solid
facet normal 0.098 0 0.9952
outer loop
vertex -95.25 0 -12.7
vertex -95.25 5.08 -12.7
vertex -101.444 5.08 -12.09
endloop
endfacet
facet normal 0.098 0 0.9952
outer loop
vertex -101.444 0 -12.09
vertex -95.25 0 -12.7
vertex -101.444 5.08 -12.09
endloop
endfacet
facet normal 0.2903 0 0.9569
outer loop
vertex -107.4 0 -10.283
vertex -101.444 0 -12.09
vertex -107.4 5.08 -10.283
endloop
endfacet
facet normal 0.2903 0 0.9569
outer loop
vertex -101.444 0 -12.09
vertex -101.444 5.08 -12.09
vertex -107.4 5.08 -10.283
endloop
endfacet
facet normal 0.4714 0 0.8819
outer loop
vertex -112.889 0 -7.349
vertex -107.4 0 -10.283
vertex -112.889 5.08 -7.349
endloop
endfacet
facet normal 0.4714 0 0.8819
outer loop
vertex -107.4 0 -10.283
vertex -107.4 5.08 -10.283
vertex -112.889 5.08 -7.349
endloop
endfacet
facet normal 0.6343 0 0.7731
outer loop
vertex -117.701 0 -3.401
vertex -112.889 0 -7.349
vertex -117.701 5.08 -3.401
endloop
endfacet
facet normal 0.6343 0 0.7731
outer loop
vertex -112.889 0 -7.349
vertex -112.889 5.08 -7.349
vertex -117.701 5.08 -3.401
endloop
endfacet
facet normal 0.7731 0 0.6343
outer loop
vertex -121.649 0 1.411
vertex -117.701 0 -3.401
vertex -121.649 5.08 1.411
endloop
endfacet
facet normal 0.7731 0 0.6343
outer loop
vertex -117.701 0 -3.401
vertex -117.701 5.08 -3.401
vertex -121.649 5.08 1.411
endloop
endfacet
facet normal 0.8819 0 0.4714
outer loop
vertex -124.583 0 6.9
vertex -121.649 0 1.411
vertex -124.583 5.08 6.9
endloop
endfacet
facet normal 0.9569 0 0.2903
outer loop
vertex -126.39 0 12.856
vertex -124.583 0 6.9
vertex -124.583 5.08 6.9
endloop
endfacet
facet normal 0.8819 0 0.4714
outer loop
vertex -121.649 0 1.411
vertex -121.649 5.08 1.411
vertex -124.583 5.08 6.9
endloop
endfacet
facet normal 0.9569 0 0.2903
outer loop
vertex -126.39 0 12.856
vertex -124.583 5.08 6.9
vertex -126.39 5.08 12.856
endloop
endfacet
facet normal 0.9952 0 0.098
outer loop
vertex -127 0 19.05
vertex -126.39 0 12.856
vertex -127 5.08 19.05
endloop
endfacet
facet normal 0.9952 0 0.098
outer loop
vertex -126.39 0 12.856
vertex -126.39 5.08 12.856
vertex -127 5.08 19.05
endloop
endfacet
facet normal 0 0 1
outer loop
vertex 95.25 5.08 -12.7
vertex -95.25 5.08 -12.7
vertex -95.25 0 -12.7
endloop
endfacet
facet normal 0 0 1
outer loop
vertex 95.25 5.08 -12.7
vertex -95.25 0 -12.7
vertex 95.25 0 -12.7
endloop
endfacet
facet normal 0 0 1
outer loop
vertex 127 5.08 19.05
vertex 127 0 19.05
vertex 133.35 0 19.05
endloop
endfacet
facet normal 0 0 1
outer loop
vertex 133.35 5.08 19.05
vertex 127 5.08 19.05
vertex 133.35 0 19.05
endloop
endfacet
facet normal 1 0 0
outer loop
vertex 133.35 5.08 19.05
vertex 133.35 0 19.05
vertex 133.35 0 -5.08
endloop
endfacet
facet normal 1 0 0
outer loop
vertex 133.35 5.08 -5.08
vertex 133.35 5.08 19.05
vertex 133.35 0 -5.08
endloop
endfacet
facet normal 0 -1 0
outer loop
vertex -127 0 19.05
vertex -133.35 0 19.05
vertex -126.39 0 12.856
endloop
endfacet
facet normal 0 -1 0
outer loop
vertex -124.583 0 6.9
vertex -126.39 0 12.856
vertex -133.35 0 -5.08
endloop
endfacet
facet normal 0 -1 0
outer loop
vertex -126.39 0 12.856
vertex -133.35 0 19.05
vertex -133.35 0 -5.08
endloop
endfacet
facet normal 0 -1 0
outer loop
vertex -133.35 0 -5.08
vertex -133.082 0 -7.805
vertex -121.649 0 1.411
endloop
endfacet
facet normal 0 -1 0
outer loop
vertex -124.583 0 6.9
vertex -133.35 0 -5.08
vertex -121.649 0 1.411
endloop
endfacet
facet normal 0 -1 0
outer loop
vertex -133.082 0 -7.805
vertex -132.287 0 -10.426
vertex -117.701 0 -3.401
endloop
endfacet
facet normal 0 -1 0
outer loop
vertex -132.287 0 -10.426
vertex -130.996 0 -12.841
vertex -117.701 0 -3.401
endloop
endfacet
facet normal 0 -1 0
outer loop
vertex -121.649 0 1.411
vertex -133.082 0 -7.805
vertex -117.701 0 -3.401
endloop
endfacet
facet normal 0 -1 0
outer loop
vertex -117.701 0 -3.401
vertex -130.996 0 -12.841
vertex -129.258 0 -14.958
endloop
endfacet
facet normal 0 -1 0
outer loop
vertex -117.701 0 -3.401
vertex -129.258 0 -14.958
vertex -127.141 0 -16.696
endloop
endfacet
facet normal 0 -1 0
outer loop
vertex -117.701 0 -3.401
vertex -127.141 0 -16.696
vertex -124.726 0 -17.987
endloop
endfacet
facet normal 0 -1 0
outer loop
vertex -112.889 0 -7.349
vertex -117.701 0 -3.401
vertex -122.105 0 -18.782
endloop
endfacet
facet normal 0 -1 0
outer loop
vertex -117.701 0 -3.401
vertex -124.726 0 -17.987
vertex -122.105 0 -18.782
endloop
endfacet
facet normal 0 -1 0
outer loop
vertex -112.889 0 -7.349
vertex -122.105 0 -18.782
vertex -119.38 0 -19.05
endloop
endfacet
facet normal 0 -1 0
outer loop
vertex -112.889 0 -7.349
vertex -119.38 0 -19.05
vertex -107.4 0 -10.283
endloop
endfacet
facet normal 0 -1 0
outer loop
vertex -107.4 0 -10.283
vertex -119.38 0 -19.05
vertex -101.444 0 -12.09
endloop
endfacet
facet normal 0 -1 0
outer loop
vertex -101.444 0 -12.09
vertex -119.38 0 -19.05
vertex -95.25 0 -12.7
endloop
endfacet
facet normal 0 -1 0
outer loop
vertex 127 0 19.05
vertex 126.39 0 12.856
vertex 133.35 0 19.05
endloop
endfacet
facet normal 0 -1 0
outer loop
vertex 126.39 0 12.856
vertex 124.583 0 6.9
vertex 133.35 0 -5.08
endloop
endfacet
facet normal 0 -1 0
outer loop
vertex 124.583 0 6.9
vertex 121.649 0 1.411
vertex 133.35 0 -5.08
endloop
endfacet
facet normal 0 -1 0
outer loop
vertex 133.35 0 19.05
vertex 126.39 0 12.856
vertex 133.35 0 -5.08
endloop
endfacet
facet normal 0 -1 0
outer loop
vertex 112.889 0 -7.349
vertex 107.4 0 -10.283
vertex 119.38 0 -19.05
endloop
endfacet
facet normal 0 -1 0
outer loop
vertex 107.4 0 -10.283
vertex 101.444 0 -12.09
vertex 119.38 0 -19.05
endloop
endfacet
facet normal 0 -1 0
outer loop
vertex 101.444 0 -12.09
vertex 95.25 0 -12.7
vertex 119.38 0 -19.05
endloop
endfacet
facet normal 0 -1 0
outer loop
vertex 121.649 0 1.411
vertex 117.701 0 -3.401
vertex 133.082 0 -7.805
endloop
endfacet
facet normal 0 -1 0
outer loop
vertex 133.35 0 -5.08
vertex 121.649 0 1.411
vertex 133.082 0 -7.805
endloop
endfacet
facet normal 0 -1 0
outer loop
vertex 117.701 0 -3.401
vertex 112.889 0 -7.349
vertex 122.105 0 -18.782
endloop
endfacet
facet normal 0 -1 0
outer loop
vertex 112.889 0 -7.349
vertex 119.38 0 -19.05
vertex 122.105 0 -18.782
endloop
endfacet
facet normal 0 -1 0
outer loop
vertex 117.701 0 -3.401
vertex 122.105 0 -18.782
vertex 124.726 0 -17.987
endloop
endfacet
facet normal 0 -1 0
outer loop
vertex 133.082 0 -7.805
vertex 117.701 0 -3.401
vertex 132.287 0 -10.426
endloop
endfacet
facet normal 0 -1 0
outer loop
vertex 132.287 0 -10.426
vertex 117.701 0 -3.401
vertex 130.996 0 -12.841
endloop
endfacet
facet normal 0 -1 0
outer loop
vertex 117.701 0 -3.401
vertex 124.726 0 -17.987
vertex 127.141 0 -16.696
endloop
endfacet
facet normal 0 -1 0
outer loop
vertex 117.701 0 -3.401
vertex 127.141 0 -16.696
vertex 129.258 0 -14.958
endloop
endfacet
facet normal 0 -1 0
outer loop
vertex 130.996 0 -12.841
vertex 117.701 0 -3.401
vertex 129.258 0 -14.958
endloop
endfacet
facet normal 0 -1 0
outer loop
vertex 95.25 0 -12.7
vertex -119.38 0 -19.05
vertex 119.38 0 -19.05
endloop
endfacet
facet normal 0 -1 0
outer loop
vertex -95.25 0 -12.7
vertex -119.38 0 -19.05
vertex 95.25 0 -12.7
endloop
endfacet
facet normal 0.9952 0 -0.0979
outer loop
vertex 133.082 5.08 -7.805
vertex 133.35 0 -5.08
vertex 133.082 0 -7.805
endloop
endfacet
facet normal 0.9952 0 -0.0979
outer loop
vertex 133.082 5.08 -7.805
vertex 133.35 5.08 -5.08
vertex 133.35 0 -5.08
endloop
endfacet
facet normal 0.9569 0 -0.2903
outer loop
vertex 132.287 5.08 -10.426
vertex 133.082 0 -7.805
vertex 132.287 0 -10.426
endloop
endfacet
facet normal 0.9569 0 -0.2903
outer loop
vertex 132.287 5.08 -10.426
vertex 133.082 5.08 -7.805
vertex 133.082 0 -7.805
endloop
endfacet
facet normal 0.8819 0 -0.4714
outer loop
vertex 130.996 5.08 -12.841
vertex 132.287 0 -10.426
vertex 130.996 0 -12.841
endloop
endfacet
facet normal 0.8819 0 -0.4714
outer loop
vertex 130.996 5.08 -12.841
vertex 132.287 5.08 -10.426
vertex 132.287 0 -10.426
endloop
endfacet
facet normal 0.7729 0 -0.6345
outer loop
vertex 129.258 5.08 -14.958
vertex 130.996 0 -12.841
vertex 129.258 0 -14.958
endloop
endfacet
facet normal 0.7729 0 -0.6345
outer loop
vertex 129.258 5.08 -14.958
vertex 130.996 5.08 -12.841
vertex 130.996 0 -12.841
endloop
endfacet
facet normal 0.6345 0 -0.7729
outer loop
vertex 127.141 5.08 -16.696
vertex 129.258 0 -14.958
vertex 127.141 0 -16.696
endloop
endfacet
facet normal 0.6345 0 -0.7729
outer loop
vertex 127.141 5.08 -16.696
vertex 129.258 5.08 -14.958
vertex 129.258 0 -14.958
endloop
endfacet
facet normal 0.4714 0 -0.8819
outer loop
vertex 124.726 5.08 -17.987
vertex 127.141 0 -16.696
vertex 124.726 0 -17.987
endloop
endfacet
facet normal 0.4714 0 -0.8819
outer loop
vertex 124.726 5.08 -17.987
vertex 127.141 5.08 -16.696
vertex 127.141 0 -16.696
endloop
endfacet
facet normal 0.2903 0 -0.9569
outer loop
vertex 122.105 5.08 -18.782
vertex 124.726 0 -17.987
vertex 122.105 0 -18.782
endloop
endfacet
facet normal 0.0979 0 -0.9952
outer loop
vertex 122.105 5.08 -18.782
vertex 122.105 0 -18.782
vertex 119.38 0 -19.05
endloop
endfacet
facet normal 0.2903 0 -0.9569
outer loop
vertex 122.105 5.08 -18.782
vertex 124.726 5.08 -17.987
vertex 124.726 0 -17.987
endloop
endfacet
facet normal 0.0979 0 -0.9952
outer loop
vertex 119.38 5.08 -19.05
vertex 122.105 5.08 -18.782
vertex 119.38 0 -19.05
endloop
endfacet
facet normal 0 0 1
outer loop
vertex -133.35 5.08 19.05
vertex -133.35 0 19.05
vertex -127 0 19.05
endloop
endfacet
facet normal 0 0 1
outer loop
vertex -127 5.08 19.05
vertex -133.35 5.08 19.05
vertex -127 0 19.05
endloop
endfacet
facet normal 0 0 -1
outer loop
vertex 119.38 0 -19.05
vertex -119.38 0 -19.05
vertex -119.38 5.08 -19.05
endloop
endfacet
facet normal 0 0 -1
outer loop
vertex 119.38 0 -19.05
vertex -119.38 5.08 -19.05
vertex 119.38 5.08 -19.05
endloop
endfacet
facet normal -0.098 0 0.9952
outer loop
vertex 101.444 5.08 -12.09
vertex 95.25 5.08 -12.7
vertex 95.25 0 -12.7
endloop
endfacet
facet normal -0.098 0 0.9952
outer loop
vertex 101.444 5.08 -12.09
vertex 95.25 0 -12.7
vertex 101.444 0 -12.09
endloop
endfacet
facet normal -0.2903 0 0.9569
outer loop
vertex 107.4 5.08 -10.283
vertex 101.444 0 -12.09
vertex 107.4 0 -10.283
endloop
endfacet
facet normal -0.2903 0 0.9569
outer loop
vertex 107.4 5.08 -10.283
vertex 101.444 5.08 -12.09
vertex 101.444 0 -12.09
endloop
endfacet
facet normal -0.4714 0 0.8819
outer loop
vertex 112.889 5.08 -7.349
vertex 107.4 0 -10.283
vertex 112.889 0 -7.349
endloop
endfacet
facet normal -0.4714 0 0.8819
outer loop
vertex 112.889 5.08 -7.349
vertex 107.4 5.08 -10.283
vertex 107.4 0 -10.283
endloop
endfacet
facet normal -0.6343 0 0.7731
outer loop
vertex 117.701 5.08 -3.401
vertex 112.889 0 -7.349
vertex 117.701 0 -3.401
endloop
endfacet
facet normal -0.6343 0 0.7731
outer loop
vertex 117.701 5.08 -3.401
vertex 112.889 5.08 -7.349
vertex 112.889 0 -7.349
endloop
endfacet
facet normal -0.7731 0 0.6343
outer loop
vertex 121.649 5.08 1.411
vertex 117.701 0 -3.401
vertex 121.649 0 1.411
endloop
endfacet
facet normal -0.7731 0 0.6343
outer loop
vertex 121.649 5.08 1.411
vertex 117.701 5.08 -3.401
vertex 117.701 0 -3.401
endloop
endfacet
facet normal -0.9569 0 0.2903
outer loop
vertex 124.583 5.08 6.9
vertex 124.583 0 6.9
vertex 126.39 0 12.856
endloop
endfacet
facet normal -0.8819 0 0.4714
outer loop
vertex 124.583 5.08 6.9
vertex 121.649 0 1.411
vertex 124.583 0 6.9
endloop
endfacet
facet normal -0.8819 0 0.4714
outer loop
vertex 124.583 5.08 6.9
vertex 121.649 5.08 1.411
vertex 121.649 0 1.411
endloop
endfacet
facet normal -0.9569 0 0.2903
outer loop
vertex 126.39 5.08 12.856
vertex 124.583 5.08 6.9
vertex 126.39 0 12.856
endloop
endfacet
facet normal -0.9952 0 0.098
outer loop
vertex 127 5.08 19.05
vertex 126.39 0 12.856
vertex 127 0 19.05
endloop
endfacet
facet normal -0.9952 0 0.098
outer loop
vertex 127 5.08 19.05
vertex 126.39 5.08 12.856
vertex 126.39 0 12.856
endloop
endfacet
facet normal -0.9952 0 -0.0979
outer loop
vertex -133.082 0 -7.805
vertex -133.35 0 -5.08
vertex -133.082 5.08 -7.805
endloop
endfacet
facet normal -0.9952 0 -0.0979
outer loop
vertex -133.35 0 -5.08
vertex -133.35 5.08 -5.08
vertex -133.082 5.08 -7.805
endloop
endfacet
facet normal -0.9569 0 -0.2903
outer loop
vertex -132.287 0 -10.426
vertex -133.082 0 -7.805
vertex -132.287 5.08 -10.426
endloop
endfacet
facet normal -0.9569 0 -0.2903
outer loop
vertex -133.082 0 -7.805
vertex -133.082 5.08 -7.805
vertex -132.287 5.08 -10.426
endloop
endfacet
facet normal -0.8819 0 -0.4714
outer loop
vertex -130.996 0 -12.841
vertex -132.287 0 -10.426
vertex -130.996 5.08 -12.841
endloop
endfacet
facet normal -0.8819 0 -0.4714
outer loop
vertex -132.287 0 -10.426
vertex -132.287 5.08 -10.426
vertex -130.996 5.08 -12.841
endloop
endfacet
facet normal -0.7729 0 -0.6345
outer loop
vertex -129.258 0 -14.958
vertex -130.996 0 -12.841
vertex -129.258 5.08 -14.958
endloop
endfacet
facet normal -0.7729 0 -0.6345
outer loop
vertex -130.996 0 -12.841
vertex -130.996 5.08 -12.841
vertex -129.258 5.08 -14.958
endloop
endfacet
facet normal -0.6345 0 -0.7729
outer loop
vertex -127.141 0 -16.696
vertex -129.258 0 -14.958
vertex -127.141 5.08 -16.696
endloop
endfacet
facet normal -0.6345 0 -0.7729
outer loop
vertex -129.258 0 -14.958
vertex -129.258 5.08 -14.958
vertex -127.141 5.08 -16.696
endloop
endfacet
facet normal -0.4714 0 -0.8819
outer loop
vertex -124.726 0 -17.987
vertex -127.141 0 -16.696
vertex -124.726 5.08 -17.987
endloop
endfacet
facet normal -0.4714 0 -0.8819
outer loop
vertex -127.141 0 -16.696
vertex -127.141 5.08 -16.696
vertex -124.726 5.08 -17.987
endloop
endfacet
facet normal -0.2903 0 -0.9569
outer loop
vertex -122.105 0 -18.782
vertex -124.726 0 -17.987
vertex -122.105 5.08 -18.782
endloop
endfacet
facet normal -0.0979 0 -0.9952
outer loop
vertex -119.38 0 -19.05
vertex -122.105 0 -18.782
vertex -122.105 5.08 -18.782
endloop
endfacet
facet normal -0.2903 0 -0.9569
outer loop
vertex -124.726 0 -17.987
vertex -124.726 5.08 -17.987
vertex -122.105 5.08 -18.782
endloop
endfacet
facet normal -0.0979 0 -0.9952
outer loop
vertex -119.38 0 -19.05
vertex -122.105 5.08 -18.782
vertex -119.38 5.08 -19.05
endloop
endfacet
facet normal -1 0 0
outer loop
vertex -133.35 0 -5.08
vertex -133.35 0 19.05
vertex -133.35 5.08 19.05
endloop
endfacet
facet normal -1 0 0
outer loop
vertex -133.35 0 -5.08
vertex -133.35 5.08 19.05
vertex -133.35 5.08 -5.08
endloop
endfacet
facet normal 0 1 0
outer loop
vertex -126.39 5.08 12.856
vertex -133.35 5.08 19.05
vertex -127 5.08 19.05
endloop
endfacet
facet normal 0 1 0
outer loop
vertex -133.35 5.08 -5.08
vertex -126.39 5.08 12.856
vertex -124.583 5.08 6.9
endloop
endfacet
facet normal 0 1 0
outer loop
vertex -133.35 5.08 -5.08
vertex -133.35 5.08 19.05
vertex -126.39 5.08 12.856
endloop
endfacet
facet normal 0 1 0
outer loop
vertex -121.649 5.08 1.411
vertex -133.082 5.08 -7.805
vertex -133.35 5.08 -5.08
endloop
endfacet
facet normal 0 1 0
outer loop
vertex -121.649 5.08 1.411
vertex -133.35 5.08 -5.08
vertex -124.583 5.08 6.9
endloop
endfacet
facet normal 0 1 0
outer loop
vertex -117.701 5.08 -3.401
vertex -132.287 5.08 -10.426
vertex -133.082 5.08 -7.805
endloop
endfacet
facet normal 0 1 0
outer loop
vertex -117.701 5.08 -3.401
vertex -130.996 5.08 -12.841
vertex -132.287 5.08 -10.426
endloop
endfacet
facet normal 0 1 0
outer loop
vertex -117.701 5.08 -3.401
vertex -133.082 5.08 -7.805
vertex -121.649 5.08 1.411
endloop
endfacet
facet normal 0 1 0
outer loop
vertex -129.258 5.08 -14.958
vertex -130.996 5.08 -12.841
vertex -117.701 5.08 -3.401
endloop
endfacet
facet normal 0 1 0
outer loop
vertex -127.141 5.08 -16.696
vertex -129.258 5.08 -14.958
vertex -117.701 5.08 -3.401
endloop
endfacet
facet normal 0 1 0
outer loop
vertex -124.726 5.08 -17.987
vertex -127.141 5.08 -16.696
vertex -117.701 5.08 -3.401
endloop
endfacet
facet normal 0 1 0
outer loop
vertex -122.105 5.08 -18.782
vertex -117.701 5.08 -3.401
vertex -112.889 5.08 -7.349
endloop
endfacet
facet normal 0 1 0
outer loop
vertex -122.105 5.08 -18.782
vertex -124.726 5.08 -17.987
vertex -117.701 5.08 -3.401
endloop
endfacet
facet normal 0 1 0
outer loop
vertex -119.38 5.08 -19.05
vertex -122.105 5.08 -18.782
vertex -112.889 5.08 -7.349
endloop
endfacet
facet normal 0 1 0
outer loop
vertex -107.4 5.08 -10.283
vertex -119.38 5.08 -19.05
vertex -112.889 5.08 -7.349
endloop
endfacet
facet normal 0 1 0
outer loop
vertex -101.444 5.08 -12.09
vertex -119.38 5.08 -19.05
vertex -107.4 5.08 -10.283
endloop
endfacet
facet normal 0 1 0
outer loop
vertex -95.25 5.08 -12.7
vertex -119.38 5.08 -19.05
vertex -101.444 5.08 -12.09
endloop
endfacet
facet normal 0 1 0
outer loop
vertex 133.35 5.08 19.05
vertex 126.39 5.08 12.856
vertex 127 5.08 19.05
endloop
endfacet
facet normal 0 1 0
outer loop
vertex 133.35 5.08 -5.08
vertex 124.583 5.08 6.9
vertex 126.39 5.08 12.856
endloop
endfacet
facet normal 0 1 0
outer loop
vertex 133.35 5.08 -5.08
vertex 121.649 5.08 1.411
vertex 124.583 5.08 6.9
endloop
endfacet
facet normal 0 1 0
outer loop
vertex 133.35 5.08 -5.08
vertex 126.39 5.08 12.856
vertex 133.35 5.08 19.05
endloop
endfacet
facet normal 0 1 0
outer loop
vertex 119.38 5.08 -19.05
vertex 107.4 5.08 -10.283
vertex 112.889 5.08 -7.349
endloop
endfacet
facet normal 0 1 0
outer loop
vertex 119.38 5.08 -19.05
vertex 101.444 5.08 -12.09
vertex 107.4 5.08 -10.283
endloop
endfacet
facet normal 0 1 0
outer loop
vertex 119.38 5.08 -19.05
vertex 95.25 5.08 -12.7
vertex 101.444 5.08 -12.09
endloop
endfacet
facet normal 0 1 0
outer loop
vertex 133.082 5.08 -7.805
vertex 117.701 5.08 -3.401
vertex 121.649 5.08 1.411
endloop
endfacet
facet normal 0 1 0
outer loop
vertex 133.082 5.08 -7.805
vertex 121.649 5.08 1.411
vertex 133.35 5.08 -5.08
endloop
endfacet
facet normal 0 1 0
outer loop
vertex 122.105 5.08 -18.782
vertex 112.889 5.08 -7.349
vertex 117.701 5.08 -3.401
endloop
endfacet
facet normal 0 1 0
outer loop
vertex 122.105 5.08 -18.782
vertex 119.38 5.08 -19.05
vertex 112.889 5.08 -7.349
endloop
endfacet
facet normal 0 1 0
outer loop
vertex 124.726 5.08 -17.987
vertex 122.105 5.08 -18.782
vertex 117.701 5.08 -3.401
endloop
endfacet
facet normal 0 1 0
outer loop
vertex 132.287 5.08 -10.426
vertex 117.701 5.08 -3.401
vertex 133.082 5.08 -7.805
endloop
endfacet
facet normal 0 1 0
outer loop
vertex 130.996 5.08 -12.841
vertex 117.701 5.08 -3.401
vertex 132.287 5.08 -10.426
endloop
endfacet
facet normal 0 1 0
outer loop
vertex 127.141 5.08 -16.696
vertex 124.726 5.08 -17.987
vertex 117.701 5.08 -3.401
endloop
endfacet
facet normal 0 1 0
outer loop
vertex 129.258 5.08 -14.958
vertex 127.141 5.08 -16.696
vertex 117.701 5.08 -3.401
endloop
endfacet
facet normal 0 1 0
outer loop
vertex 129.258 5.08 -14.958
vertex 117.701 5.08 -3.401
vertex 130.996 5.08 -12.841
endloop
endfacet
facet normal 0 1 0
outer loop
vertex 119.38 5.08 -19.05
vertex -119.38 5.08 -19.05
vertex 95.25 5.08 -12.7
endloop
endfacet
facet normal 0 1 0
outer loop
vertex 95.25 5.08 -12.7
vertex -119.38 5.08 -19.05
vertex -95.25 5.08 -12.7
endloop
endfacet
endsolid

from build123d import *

# Parameters (mm, degrees)
SKETCH1_W          = 266.7
SKETCH1_H          = 38.1
BUMPER_BASE_DEPTH  = 5.08
CUT_EXTRUDE1_DEPTH = 135.79959718
FILLET1_R          = 13.97


with BuildPart() as part:
    # Sketch1 → Bumper-Base (new body)
    with BuildSketch(Plane(origin=(0, 0, 0), x_dir=(1, 0, 0), z_dir=(0, 1, 0))):
        Rectangle(SKETCH1_W, SKETCH1_H)
    extrude(amount=BUMPER_BASE_DEPTH)

    # Sketch2 → Cut-Extrude1 (cut, symmetric)
    with BuildSketch(Plane(origin=(0, 5.08, 0), x_dir=(1, 0, 0), z_dir=(0, 1, 0))):
        with BuildLine():
            Line((0, 12.7), (-95.25, 12.7))
            ThreePointArc((-95.25, 12.7), (-117.700640303, 3.400640303), (-127, -19.05))
            Line((-127, -19.05), (-95.25, -19.05))
            Line((-95.25, -19.05), (0, -19.05))
            Line((0, -19.05), (0, 12.7))
        make_face()
    cut_extrude1 = extrude(amount=CUT_EXTRUDE1_DEPTH, both=True, mode=Mode.SUBTRACT)

    # Mirror1: Cut-Extrude1 across plane
    add(cut_extrude1.mirror(Plane(origin=(0, 0, 0), x_dir=(0, 0, 1), z_dir=(1, 0, 0))), mode=Mode.SUBTRACT)

    # Fillet1
    fillet1_edges = [part.edges().sort_by_distance(p)[0] for p in [
        (-133.35, 2.54, -19.05),
        (133.35, 2.54, -19.05),
    ]]
    fillet(fillet1_edges, radius=FILLET1_R)


solid = part.part
